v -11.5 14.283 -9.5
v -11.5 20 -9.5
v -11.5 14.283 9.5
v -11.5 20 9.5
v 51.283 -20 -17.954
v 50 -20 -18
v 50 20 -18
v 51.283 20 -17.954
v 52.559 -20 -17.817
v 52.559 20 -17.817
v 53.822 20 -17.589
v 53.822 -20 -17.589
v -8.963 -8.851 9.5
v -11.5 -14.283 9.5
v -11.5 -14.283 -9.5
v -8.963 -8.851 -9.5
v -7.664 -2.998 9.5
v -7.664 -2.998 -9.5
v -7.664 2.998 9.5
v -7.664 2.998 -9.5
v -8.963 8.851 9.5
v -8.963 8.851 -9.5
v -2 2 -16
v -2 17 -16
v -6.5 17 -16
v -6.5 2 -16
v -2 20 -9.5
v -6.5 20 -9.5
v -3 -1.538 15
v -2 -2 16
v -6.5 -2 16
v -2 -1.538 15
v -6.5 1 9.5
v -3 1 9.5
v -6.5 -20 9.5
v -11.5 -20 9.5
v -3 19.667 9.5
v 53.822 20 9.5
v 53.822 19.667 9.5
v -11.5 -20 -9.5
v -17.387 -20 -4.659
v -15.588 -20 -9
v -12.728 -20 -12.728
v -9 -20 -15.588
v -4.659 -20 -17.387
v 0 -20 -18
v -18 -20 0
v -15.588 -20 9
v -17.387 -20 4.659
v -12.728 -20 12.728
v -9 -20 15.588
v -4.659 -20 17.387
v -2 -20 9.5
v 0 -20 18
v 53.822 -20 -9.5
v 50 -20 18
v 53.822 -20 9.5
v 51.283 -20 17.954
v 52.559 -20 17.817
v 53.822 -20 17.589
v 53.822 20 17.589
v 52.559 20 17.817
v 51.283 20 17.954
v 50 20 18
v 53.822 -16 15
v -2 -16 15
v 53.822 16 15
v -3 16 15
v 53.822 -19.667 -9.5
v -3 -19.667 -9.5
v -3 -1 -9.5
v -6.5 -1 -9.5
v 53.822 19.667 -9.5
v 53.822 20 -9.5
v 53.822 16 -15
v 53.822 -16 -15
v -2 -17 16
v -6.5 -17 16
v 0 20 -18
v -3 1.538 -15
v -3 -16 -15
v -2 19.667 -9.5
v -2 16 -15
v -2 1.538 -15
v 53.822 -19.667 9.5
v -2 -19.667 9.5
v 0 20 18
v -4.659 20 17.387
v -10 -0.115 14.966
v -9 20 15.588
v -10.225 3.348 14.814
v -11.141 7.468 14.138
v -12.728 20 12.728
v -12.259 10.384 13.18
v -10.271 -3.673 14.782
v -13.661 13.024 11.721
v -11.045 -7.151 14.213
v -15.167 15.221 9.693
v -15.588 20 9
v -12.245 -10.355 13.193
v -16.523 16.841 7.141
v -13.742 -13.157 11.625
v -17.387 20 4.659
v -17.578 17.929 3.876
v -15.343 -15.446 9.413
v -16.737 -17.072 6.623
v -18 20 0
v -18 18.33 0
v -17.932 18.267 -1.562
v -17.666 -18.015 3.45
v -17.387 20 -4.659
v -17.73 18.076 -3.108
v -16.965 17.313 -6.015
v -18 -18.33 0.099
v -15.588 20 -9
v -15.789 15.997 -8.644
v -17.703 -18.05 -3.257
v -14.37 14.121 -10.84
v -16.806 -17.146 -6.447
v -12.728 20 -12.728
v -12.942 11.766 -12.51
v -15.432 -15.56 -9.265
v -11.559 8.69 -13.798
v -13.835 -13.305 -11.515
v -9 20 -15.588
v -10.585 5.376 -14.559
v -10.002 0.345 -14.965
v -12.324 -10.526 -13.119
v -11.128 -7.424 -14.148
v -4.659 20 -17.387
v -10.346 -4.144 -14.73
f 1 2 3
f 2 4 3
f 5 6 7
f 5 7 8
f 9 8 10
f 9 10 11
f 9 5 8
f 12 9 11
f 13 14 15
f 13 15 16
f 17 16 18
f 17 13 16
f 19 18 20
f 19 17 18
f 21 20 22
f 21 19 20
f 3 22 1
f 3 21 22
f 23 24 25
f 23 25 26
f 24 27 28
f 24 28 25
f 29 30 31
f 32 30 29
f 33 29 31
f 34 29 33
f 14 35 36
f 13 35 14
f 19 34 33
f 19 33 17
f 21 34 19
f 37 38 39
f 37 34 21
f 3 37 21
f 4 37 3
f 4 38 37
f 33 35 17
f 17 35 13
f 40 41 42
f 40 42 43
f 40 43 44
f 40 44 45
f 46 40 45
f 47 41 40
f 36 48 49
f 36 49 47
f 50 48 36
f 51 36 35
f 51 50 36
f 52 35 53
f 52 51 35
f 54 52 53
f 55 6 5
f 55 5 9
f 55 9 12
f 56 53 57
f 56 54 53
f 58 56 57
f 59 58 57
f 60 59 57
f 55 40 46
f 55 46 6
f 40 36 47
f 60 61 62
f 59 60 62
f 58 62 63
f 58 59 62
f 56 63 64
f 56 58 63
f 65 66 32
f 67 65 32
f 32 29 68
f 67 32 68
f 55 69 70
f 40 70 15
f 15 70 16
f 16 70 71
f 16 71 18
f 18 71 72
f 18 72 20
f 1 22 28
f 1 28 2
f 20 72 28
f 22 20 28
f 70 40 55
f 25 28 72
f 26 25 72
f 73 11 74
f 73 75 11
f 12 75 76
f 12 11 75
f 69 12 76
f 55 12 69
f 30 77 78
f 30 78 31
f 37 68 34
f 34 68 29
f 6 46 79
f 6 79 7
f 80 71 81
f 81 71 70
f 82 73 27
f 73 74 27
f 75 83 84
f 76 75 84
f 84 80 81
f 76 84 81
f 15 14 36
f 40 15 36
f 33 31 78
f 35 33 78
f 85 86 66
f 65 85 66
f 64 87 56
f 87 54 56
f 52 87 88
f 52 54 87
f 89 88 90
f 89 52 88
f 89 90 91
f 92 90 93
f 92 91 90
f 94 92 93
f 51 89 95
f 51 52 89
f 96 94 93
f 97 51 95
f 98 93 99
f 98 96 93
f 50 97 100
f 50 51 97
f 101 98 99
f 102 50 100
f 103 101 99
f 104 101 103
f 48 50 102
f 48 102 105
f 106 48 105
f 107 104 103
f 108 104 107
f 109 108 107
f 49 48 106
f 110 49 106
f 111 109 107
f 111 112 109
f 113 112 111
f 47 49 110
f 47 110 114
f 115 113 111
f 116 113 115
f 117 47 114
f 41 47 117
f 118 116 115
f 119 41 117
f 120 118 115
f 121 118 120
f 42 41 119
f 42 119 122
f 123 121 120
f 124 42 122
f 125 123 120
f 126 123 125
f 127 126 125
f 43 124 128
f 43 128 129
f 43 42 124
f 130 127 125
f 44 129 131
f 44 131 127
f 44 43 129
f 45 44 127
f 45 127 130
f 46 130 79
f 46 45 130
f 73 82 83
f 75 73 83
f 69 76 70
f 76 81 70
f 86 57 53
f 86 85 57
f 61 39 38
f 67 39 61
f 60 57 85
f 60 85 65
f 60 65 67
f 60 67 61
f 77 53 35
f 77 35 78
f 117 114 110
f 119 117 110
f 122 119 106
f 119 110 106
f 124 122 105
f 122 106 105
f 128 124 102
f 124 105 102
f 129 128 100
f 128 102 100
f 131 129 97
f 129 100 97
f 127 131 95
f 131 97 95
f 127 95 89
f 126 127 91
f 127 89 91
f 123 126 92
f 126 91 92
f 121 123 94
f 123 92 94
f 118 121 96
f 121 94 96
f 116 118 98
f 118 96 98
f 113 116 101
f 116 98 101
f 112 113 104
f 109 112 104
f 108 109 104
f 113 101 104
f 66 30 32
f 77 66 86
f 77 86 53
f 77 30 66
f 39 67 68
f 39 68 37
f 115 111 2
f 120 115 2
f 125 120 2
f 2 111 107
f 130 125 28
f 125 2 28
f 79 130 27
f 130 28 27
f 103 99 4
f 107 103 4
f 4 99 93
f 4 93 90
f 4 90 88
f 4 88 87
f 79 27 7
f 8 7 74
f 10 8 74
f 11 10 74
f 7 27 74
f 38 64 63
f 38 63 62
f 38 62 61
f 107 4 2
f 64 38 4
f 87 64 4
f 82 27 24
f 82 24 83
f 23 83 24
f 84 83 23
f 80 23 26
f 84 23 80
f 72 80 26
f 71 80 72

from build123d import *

# Parameters (mm, degrees)
PAD_DEPTH            = 20
SKETCH001_R          = 25
POCKET_DEPTH         = 18.001
POCKET_DEPTH_BACK    = -18.001
POCKET001_DEPTH      = 9.5
POCKET002_DEPTH      = 3
POCKET002_DEPTH_BACK = -55
POCKET003_DEPTH      = 4.5
SKETCH006_W          = 30.00024
SKETCH006_H          = 49.987866
POCKET004_DEPTH      = 20.001
POCKET004_DEPTH_BACK = -20.001


with BuildPart() as part:
    # Sketch → Pad (new body, symmetric)
    with BuildSketch(Plane.XZ):
        with BuildLine():
            ThreePointArc((0, 18), (-18, 0), (0, -18))
            Line((0, -18), (50, -18))
            ThreePointArc((50, -18), (68, 0), (50, 18))
            Line((0, 18), (50, 18))
        make_face()
    extrude(amount=PAD_DEPTH, both=True)

    # Sketch001 → Pocket (cut, two sides)
    with BuildSketch(Plane.XY) as pocket_sk:
        with Locations((-35, 0)):
            Circle(SKETCH001_R)
        with Locations((85, 0)):
            Circle(SKETCH001_R)
    extrude(amount=-POCKET_DEPTH, mode=Mode.SUBTRACT)
    extrude(pocket_sk.sketch, amount=-POCKET_DEPTH_BACK, mode=Mode.SUBTRACT)

    # Sketch002 (on DatumPlane) → Pocket001 (cut, symmetric)
    with BuildSketch(Plane.XY):
        with BuildLine():
            ThreePointArc((-11.5, -14.282857), (-7.5, 0), (-11.5, 14.282857))
            Line((-11.5, 20), (-11.5, 14.282857))
            Line((-11.5, 20), (55, 20))
            Line((55, 20), (55, -20))
            Line((-11.5, -20), (55, -20))
            Line((-11.5, -14.282857), (-11.5, -20))
        make_face()
    extrude(amount=POCKET001_DEPTH, both=True, mode=Mode.SUBTRACT)

    # Sketch003 (on DatumPlane) → Pocket002 (cut, two sides)
    with BuildSketch(Plane.YZ) as pocket002_sk:
        Polygon((-20, 9), (-16, 15), (16, 15), (20, 9), (20, -9), (16, -15), (-16, -15), (-20, -9), align=None)
    extrude(amount=-POCKET002_DEPTH, mode=Mode.SUBTRACT)
    extrude(pocket002_sk.sketch, amount=-POCKET002_DEPTH_BACK, mode=Mode.SUBTRACT)

    # Sketch005 (on DatumPlane) → Pocket003 (cut)
    with BuildSketch(Plane.YZ.offset(-2)):
        Polygon((-17, 16), (-2, 16), (1, 9.5), (-20, 9.5), align=None)
        Polygon((-1, -9.5), (20, -9.5), (17, -16), (2, -16), align=None)
    extrude(amount=-POCKET003_DEPTH, mode=Mode.SUBTRACT)

    # Sketch006 → Pocket004 (cut, two sides)
    with BuildSketch(Plane.XZ) as pocket004_sk:
        with Locations((68.822588, 0.861696)):
            Rectangle(SKETCH006_W, SKETCH006_H)
    extrude(amount=-POCKET004_DEPTH, mode=Mode.SUBTRACT)
    extrude(pocket004_sk.sketch, amount=-POCKET004_DEPTH_BACK, mode=Mode.SUBTRACT)


solid = part.part
